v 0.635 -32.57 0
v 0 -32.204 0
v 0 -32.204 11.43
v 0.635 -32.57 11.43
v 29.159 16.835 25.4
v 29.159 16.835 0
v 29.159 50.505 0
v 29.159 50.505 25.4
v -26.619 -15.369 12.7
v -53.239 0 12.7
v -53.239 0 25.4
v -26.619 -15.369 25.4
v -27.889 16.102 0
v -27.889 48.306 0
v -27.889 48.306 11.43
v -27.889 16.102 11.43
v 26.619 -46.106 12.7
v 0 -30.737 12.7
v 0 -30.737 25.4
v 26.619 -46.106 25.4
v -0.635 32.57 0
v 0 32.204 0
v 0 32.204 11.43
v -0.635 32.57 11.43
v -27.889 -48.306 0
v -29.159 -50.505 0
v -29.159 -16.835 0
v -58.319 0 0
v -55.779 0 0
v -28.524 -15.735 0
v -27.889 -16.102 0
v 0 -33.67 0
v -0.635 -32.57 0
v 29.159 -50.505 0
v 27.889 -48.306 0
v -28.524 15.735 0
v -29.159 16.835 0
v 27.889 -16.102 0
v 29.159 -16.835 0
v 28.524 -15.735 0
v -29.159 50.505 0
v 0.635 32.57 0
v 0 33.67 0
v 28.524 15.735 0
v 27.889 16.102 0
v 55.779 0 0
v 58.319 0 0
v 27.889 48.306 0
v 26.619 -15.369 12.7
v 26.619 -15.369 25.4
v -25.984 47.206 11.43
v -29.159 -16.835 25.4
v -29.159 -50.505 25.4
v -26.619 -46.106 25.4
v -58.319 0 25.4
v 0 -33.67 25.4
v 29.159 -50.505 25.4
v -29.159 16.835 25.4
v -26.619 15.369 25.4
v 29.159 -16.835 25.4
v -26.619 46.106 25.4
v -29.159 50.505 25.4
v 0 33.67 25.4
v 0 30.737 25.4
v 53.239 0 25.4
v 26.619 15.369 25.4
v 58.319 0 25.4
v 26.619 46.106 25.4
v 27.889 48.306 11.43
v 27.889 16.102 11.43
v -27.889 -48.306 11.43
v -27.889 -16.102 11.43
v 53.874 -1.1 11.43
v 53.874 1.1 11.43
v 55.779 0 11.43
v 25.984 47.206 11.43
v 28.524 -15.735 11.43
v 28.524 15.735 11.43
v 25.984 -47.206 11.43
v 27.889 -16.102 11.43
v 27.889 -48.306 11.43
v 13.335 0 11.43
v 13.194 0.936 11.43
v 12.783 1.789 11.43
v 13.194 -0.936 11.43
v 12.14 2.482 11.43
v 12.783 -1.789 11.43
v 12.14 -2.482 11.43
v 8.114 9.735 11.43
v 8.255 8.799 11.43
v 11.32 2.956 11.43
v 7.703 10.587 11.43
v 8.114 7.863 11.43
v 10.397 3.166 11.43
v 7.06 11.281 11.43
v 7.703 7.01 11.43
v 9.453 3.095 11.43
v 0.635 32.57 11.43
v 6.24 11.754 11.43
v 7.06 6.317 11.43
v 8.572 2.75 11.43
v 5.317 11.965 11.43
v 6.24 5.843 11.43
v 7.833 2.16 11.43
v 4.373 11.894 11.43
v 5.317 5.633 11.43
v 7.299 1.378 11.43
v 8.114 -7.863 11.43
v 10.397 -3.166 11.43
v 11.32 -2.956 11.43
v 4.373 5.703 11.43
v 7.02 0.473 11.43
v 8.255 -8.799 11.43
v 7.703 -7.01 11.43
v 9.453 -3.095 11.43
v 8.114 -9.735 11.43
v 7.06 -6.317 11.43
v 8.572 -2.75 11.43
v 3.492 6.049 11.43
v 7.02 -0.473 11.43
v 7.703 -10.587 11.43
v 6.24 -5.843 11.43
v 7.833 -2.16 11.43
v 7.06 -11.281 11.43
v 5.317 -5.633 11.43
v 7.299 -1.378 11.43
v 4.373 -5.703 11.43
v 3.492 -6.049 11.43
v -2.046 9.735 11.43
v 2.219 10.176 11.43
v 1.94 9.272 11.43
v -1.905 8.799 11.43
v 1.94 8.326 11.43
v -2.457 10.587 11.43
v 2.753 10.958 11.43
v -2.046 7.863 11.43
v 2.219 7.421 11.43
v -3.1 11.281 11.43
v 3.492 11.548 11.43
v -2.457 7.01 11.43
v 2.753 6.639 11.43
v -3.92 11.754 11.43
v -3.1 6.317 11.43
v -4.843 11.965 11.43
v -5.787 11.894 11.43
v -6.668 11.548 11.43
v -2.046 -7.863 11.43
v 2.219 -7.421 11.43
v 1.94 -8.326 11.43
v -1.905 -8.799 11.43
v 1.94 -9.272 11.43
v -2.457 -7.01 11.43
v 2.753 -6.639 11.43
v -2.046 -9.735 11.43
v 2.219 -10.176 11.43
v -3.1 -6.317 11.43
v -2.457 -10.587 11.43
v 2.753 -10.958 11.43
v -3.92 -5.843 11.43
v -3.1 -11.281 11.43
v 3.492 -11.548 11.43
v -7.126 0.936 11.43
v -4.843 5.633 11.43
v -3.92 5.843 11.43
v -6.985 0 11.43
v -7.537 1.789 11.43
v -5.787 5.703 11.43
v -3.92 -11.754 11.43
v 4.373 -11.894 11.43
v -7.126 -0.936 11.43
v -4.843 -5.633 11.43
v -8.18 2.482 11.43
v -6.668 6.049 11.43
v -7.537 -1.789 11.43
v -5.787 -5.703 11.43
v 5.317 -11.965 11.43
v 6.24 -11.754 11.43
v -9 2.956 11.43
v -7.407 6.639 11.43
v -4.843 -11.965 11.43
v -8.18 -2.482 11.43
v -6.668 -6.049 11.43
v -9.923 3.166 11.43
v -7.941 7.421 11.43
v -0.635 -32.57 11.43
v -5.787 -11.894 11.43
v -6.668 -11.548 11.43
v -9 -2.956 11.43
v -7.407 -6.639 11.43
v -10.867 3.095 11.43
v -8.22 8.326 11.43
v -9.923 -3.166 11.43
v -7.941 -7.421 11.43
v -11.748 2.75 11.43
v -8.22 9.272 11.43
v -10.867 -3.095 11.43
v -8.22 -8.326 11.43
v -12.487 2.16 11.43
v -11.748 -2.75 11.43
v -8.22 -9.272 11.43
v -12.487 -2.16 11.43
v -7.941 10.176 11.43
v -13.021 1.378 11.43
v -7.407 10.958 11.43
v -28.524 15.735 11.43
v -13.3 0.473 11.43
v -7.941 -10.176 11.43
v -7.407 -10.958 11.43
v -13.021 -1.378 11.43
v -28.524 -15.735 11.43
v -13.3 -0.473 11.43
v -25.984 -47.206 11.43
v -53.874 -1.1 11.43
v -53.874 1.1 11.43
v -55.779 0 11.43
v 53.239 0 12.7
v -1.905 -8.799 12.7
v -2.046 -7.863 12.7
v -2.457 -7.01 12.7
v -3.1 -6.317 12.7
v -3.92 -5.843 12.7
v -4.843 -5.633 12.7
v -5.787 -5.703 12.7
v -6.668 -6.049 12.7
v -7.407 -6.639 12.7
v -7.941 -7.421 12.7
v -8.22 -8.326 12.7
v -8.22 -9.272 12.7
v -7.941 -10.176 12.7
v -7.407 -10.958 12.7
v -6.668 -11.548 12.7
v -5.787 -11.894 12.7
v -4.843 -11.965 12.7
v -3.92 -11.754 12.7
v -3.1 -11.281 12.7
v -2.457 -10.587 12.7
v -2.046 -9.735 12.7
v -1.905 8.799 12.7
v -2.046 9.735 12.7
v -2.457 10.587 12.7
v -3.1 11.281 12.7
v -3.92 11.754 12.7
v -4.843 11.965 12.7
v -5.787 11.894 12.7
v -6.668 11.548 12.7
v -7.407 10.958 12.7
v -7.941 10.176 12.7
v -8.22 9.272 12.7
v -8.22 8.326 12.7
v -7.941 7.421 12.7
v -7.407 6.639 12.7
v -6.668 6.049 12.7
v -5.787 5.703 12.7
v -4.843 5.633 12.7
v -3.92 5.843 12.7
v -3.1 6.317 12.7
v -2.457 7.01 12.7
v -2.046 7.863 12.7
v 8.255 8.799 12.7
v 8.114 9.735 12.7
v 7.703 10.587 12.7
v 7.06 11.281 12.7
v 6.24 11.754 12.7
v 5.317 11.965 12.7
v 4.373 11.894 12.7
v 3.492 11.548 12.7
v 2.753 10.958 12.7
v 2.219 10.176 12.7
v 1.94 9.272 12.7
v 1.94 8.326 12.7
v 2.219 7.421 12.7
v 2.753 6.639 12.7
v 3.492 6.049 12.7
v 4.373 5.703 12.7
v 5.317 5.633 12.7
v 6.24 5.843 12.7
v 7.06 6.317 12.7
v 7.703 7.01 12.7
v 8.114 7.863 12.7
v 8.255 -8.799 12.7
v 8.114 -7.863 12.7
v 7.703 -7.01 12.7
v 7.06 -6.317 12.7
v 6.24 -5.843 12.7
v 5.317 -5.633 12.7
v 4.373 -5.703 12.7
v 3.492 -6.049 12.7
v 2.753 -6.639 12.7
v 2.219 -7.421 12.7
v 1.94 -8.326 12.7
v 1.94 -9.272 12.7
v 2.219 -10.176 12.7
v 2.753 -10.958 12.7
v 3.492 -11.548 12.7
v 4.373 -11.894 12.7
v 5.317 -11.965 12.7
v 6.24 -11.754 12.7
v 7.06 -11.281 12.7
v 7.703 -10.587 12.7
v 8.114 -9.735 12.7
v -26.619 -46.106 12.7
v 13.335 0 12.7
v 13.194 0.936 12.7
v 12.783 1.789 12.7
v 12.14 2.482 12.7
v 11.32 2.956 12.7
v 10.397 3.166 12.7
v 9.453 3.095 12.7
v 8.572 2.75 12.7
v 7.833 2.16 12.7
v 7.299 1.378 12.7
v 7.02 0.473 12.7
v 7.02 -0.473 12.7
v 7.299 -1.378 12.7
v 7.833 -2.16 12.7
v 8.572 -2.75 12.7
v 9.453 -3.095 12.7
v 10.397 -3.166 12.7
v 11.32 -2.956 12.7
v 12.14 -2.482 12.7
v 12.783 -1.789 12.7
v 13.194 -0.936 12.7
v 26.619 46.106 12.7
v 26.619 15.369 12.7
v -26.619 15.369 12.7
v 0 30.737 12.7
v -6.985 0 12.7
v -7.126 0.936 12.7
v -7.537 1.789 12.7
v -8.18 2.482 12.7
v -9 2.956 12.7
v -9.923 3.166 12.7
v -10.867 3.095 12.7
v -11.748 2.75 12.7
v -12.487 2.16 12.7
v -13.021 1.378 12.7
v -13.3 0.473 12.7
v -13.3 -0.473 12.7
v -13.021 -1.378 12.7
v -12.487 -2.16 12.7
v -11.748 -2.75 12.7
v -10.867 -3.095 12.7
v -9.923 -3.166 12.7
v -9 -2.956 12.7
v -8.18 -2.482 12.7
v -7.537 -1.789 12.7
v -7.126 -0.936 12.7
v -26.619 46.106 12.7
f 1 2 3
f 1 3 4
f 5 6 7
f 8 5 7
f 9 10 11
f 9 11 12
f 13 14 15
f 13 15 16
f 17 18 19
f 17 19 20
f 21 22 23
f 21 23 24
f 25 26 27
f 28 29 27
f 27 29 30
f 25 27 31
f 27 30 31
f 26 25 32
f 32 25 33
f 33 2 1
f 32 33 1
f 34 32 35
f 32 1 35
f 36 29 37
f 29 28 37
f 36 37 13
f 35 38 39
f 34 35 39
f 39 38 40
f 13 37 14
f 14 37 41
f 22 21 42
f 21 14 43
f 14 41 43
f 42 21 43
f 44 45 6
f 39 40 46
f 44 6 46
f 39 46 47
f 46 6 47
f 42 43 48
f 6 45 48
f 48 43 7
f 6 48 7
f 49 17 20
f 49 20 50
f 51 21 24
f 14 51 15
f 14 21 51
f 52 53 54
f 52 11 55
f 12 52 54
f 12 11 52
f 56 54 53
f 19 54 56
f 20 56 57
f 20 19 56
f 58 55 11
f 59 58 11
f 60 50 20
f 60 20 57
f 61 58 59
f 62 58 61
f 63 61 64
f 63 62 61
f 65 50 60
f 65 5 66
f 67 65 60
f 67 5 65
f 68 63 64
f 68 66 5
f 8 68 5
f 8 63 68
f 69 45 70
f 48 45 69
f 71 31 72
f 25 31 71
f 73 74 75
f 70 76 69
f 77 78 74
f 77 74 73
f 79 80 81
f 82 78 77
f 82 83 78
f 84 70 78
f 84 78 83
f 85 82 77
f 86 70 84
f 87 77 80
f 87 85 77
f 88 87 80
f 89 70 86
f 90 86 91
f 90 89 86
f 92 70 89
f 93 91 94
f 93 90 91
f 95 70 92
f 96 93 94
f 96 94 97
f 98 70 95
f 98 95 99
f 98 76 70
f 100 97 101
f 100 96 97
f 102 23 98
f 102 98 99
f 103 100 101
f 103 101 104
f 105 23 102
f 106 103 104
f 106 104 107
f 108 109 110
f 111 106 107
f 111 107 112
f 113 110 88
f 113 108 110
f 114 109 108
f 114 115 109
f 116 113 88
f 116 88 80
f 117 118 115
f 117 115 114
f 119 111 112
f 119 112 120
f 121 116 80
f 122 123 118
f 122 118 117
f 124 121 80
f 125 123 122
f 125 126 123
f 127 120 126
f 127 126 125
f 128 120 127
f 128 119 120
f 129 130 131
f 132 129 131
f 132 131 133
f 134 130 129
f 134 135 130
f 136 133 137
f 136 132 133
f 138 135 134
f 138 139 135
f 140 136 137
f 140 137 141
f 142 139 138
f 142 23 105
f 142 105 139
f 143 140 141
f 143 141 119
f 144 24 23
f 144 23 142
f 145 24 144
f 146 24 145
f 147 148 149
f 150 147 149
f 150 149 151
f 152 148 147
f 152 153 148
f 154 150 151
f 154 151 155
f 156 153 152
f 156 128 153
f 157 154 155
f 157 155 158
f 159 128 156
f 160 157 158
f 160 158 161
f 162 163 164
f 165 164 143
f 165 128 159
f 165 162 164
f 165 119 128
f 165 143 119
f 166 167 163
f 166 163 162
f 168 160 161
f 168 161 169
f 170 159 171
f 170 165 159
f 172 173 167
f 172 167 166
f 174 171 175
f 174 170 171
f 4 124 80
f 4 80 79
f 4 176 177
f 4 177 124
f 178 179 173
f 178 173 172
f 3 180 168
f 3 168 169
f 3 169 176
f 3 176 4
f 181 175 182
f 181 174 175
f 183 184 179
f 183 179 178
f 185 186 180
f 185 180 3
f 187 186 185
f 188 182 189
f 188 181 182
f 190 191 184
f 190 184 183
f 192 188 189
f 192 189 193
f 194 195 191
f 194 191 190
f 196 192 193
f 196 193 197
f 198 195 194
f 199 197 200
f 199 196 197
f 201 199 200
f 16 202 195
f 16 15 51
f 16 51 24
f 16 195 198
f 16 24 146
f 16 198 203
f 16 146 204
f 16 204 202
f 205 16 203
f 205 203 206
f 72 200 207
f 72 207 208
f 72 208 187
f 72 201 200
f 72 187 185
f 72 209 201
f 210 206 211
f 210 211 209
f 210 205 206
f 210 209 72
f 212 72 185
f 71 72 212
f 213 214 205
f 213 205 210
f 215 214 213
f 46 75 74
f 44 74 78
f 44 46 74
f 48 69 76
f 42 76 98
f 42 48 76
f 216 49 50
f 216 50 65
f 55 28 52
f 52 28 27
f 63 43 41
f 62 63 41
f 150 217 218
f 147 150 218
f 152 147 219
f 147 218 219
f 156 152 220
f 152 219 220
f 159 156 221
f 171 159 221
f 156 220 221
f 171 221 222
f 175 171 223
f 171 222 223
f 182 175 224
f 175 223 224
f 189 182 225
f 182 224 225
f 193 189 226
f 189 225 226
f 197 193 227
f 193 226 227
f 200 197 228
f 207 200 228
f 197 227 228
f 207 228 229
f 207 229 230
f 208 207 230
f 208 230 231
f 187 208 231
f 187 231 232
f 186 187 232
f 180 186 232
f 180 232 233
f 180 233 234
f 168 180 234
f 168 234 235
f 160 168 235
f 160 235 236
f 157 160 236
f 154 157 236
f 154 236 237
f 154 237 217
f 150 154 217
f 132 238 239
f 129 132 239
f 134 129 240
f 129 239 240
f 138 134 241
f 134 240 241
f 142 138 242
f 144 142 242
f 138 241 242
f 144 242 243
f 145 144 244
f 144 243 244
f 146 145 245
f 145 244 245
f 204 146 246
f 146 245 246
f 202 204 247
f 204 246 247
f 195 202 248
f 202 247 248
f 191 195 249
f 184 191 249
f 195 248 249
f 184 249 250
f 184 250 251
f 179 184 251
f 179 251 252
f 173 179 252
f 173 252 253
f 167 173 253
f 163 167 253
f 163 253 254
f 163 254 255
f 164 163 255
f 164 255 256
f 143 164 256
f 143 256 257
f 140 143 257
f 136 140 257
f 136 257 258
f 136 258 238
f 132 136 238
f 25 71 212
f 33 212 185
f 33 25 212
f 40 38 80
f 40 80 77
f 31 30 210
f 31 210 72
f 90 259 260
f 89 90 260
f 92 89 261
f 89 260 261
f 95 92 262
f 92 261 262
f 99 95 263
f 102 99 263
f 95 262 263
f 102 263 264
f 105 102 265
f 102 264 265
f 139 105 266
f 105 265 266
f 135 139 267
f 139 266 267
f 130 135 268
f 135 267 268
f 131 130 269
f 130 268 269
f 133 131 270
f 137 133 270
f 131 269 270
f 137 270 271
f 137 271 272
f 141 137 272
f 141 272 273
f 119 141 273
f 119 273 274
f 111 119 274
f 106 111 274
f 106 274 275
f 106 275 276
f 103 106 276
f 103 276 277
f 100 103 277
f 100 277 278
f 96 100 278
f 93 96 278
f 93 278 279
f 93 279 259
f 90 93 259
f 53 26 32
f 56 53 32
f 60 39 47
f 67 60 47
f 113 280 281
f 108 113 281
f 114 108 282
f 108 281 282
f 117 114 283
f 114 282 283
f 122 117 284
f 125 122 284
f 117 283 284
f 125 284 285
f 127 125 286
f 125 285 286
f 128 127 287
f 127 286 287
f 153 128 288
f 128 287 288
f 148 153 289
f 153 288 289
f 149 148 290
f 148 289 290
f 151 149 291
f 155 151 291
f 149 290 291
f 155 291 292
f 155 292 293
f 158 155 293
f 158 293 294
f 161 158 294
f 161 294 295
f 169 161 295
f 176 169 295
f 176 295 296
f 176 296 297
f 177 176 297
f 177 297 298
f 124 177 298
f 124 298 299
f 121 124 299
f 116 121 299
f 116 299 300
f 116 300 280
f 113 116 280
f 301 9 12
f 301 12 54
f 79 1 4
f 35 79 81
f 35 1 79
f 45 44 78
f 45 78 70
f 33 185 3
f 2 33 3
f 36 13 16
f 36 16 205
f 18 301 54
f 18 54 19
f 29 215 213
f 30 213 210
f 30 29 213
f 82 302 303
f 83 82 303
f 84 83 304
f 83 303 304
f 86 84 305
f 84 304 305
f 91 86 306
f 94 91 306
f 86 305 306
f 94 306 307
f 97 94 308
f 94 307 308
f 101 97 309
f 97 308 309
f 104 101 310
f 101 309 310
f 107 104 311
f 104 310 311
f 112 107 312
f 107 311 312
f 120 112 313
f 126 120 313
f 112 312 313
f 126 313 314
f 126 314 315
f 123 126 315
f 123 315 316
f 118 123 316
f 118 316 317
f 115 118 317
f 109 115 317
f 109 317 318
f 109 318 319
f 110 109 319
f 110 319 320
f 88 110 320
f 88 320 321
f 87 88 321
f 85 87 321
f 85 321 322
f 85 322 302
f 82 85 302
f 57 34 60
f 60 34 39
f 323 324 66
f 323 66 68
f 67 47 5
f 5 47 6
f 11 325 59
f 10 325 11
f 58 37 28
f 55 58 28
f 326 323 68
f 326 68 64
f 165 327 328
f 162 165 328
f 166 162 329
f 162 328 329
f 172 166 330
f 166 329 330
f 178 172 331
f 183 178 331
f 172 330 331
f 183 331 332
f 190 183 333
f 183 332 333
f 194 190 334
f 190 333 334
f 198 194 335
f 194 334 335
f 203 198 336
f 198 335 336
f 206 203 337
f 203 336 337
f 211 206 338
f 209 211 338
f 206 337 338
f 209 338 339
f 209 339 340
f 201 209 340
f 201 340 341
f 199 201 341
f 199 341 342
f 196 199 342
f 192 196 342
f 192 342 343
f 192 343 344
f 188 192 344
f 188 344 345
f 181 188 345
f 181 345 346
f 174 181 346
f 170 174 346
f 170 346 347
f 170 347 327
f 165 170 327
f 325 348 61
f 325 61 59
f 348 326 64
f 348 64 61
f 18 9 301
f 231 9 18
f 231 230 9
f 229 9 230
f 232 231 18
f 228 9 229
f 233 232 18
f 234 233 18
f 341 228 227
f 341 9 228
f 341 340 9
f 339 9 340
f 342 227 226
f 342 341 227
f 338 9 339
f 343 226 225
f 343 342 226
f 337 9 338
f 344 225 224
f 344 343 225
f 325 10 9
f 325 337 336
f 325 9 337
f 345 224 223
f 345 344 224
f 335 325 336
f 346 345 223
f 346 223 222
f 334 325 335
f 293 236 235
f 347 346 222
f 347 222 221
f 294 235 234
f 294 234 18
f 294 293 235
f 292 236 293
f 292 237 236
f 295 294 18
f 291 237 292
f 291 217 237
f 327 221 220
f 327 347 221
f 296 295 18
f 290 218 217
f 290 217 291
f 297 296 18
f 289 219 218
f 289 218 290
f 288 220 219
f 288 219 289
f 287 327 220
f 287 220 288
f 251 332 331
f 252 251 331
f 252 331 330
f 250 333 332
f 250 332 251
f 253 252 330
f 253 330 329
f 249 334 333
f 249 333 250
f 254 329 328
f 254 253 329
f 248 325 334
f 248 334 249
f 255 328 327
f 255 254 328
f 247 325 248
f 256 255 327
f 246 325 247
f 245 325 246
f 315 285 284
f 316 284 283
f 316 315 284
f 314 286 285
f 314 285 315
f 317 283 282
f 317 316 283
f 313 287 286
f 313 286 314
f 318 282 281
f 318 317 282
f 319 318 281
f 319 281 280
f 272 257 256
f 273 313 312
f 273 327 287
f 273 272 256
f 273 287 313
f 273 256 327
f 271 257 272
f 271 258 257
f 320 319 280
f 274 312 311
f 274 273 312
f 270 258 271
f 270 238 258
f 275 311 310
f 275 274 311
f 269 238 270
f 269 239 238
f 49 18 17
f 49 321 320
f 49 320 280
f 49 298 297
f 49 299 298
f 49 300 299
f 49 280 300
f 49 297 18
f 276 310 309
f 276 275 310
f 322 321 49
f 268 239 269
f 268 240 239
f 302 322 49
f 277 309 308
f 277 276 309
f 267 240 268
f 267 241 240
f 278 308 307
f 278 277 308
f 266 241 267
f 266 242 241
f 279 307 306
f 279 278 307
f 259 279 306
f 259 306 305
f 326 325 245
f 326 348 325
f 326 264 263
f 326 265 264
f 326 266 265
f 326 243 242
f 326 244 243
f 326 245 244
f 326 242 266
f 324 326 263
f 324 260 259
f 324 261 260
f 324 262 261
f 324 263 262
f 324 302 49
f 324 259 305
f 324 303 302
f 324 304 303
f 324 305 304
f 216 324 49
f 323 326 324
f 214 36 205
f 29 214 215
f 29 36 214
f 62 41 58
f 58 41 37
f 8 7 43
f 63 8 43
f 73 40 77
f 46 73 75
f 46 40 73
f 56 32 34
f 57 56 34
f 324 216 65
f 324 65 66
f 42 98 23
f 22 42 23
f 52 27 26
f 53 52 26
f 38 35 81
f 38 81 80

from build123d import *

# Parameters (mm, degrees)
F1_DEPTH     = 25.4
F2_T         = -2.54
F3_DEPTH     = 12.7
F4_T         = 1.27
F4_T3_DEPTH  = 27.94
F4_T5_DEPTH  = 33.2773657547
F4_T7_DEPTH  = 15.24
F4_T9_DEPTH  = 33.2773657547
F4_T11_DEPTH = 33.2773657547
F4_T13_DEPTH = 33.2773657547
F4_T15_DEPTH = 33.2773657547
F4_T17_DEPTH = 33.2773657547
F4_T19_DEPTH = 33.2773657547
F4_T21_DEPTH = 33.2773657547
F4_T23_DEPTH = 33.2773657547
F4_T25_DEPTH = 33.2773657547
F5_R         = 3.175
F6_DEPTH     = 25.4


# Not quite as in the source:
# - a shell that OpenCascade refuses in one call is made with other operations: the cavity is built on its own and cut out


with BuildPart() as f1:
    # F0 (on Top) → F1 (new body)
    with BuildSketch(Plane.XY):
        Polygon((-58.3186791779, 0), (-29.159339589, -16.8351525611), (-29.159339589, -50.5054576833), (0, -33.6703051222), (29.159339589, -50.5054576833), (29.159339589, -16.8351525611), (58.3186791779, 0), (29.159339589, 16.8351525611), (29.159339589, 50.5054576833), (0, 33.6703051222), (-29.159339589, 50.5054576833), (-29.159339589, 16.8351525611), align=None)
    extrude(amount=F1_DEPTH)

    # F2
    f2_openings = [f1.faces().sort_by_distance(p)[0] for p in [
        (0, 0, 25.4),
    ]]
    offset(amount=F2_T, openings=f2_openings, kind=Kind.INTERSECTION)

    # F0 (on Top) → F3 (join)
    with BuildSketch(Plane.XY):
        Polygon((-58.3186791779, 0), (-29.159339589, -16.8351525611), (-29.159339589, -50.5054576833), (0, -33.6703051222), (29.159339589, -50.5054576833), (29.159339589, -16.8351525611), (58.3186791779, 0), (29.159339589, 16.8351525611), (29.159339589, 50.5054576833), (0, 33.6703051222), (-29.159339589, 50.5054576833), (-29.159339589, 16.8351525611), align=None)
    extrude(amount=F3_DEPTH)

    # F4: shell of thickness 1.27, made by hand


with BuildPart() as f4_core1:
    # F4_t2: copy of F1
    add(f1.part)

    # the walls: a layer under each face that stays
    f4_faces = [f4_core1.faces().sort_by_distance(p)[0] for p in [
        (-43.7390093835, -8.4175762805, 12.7),
        (-29.159339589, -33.6703051222, 12.7),
        (-14.5796697945, -42.0878814027, 12.7),
        (14.5796697945, -42.0878814027, 12.7),
        (29.159339589, -33.6703051222, 12.7),
        (43.7390093835, -8.4175762805, 12.7),
        (43.7390093835, 8.4175762805, 12.7),
        (29.159339589, 33.6703051222, 12.7),
        (14.5796697945, 42.0878814027, 12.7),
        (-14.5796697945, 42.0878814027, 12.7),
        (-29.159339589, 33.6703051222, 12.7),
        (-54.4307672328, 0, 25.4),
        (-26.619339589, -30.7373657547, 19.05),
        (0, 0, 12.7),
        (-13.3096697945, -38.4217071934, 19.05),
        (13.3096697945, -38.4217071934, 19.05),
        (26.619339589, -30.7373657547, 19.05),
        (39.9290093835, -7.6843414387, 19.05),
        (39.9290093835, 7.6843414387, 19.05),
        (26.619339589, 30.7373657547, 19.05),
        (13.3096697945, 38.4217071934, 19.05),
        (-13.3096697945, 38.4217071934, 19.05),
        (-26.619339589, 30.7373657547, 19.05),
        (-39.9290093835, 7.6843414387, 19.05),
        (-39.9290093835, -7.6843414387, 19.05),
        (-43.7390093835, 8.4175762805, 12.7),
    ]]
    thicken(f4_faces, amount=-F4_T, mode=Mode.SUBTRACT)

    # F4_s4 → F4_t3 (cut)
    with BuildSketch(Plane.XY.offset(-1.27)):
        Polygon((-29.178389589, -16.8461510837), (-28.524339589, -15.7353002983), (-27.889339589, -16.1019177192), (-27.889339589, -16.8351525611), align=None)
        Polygon((0, -33.6923021674), (-0.635, -32.5704528594), (0, -32.2038354384), (0.635, -32.5704528594), align=None)
        Polygon((29.178389589, -16.8461510837), (27.889339589, -16.8351525611), (27.889339589, -16.1019177192), (28.524339589, -15.7353002983), align=None)
        Polygon((29.178389589, 16.8461510837), (28.524339589, 15.7353002983), (27.889339589, 16.1019177192), (27.889339589, 16.8351525611), align=None)
        Polygon((0, 33.6923021674), (0.635, 32.5704528594), (0, 32.2038354384), (-0.635, 32.5704528594), align=None)
        Polygon((-29.178389589, 16.8461510837), (-27.889339589, 16.8351525611), (-27.889339589, 16.1019177192), (-28.524339589, 15.7353002983), align=None)
    extrude(amount=F4_T3_DEPTH, mode=Mode.SUBTRACT)

    # F4_s6 → F4_t5 (cut)
    with BuildSketch(Plane.XZ.offset(14.0986828773)):
        Polygon((-26.606639589, 12.7127), (-27.889339589, 12.7), (-27.889339589, 11.43), (-26.619339589, 11.43), align=None)
        Polygon((26.606639589, 12.7127), (26.619339589, 11.43), (27.889339589, 11.43), (27.889339589, 12.7), align=None)
    extrude(amount=F4_T5_DEPTH, mode=Mode.SUBTRACT)

    # F4_s8 → F4_t7 (cut)
    with BuildSketch(Plane.XY.offset(11.43)):
        Polygon((-26.612989589, -46.0950501094), (-27.889339589, -46.106048632), (-27.889339589, -48.3057531576), (-25.984339589, -47.2059008948), align=None)
        Polygon((26.612989589, -46.0950501094), (25.984339589, -47.2059008948), (27.889339589, -48.3057531576), (27.889339589, -46.106048632), align=None)
        Polygon((53.2259791779, 0), (53.8736791779, -1.0998522628), (55.7786791779, 0), (53.8736791779, 1.0998522628), align=None)
        Polygon((26.612989589, 46.0950501094), (27.889339589, 46.106048632), (27.889339589, 48.3057531576), (25.984339589, 47.2059008948), align=None)
        Polygon((-26.612989589, 46.0950501094), (-25.984339589, 47.2059008948), (-27.889339589, 48.3057531576), (-27.889339589, 46.106048632), align=None)
        Polygon((-53.2259791779, 0), (-53.8736791779, 1.0998522628), (-55.7786791779, 0), (-53.8736791779, -1.0998522628), align=None)
    extrude(amount=F4_T7_DEPTH, mode=Mode.SUBTRACT)

    # F4_s10 → F4_t9 (cut)
    with BuildSketch(Plane(origin=(-12.2098175317, -7.0493414387, 0), x_dir=(0, 0, 1), z_dir=(-0.8660254038, -0.5, 0))):
        Polygon((12.7127, 26.606639589), (11.43, 26.619339589), (11.43, 27.889339589), (12.7, 27.889339589), align=None)
    extrude(amount=F4_T9_DEPTH, mode=Mode.SUBTRACT)

    # F4_s12 → F4_t11 (cut)
    with BuildSketch(Plane.XZ.offset(-47.376048632)):
        Polygon((-26.606639589, 12.7127), (-26.619339589, 11.43), (-27.889339589, 11.43), (-27.889339589, 12.7), align=None)
        Polygon((26.606639589, 12.7127), (26.619339589, 11.43), (27.889339589, 11.43), (27.889339589, 12.7), align=None)
    extrude(amount=F4_T11_DEPTH, mode=Mode.SUBTRACT)

    # F4_s14 → F4_t13 (cut)
    with BuildSketch(Plane(origin=(-12.2098175317, 7.0493414387, 0), x_dir=(0, 0, 1), z_dir=(-0.8660254038, 0.5, 0))):
        Polygon((12.7127, 26.606639589), (11.43, 26.619339589), (11.43, 27.889339589), (12.7, 27.889339589), align=None)
    extrude(amount=F4_T13_DEPTH, mode=Mode.SUBTRACT)

    # F4_s16 → F4_t15 (cut)
    with BuildSketch(Plane(origin=(41.0288616463, 23.688024316, 0), x_dir=(0, 0, 1), z_dir=(-0.8660254038, -0.5, 0))):
        Polygon((12.7127, 26.606639589), (11.43, 26.619339589), (11.43, 27.889339589), (12.7, 27.889339589), align=None)
    extrude(amount=F4_T15_DEPTH, mode=Mode.SUBTRACT)

    # F4_s18 → F4_t17 (cut)
    with BuildSketch(Plane(origin=(41.0288616463, -23.688024316, 0), x_dir=(0, 0, 1), z_dir=(-0.8660254038, 0.5, 0))):
        Polygon((12.7127, 26.606639589), (11.43, 26.619339589), (11.43, 27.889339589), (12.7, 27.889339589), align=None)
    extrude(amount=F4_T17_DEPTH, mode=Mode.SUBTRACT)

    # F4_s20 → F4_t19 (cut)
    with BuildSketch(Plane(origin=(12.2098175317, 7.0493414387, 0), x_dir=(0, 0, 1), z_dir=(0.8660254038, 0.5, 0))):
        Polygon((12.7127, 26.606639589), (11.43, 26.619339589), (11.43, 27.889339589), (12.7, 27.889339589), align=None)
    extrude(amount=F4_T19_DEPTH, mode=Mode.SUBTRACT)

    # F4_s22 → F4_t21 (cut)
    with BuildSketch(Plane(origin=(12.2098175317, -7.0493414387, 0), x_dir=(0, 0, 1), z_dir=(0.8660254038, -0.5, 0))):
        Polygon((12.7127, 26.606639589), (11.43, 26.619339589), (11.43, 27.889339589), (12.7, 27.889339589), align=None)
    extrude(amount=F4_T21_DEPTH, mode=Mode.SUBTRACT)

    # F4_s24 → F4_t23 (cut)
    with BuildSketch(Plane(origin=(-41.0288616463, -23.688024316, 0), x_dir=(0, 0, 1), z_dir=(0.8660254038, 0.5, 0))):
        Polygon((12.7127, 26.606639589), (11.43, 26.619339589), (11.43, 27.889339589), (12.7, 27.889339589), align=None)
    extrude(amount=F4_T23_DEPTH, mode=Mode.SUBTRACT)

    # F4_s26 → F4_t25 (cut)
    with BuildSketch(Plane(origin=(-41.0288616463, 23.688024316, 0), x_dir=(0, 0, 1), z_dir=(0.8660254038, -0.5, 0))):
        Polygon((12.7127, 26.606639589), (11.43, 26.619339589), (11.43, 27.889339589), (12.7, 27.889339589), align=None)
    extrude(amount=F4_T25_DEPTH, mode=Mode.SUBTRACT)


with BuildPart() as f1_1:
    add(f1.part)

    # what is left inside the walls is the cavity
    f4_cavity = [f4_core1.part.solids().sort_by_distance(p)[0] for p in [
        (13.94467, -8.050959, 11.4173),
    ]]
    add(f4_cavity, mode=Mode.SUBTRACT)

    # F5 (on face) → F6 (cut)
    with BuildSketch(Plane.XY.offset(12.7)):
        with Locations((5.08, 8.7988181024)):
            Circle(F5_R)
        with Locations((10.16, 0)):
            Circle(F5_R)
        with Locations((5.08, -8.7988181024)):
            Circle(F5_R)
        with Locations((-5.08, -8.7988181024)):
            Circle(F5_R)
        with Locations((-10.16, 0)):
            Circle(F5_R)
        with Locations((-5.08, 8.7988181024)):
            Circle(F5_R)
    extrude(amount=-F6_DEPTH, mode=Mode.SUBTRACT)


solid = f1_1.part
